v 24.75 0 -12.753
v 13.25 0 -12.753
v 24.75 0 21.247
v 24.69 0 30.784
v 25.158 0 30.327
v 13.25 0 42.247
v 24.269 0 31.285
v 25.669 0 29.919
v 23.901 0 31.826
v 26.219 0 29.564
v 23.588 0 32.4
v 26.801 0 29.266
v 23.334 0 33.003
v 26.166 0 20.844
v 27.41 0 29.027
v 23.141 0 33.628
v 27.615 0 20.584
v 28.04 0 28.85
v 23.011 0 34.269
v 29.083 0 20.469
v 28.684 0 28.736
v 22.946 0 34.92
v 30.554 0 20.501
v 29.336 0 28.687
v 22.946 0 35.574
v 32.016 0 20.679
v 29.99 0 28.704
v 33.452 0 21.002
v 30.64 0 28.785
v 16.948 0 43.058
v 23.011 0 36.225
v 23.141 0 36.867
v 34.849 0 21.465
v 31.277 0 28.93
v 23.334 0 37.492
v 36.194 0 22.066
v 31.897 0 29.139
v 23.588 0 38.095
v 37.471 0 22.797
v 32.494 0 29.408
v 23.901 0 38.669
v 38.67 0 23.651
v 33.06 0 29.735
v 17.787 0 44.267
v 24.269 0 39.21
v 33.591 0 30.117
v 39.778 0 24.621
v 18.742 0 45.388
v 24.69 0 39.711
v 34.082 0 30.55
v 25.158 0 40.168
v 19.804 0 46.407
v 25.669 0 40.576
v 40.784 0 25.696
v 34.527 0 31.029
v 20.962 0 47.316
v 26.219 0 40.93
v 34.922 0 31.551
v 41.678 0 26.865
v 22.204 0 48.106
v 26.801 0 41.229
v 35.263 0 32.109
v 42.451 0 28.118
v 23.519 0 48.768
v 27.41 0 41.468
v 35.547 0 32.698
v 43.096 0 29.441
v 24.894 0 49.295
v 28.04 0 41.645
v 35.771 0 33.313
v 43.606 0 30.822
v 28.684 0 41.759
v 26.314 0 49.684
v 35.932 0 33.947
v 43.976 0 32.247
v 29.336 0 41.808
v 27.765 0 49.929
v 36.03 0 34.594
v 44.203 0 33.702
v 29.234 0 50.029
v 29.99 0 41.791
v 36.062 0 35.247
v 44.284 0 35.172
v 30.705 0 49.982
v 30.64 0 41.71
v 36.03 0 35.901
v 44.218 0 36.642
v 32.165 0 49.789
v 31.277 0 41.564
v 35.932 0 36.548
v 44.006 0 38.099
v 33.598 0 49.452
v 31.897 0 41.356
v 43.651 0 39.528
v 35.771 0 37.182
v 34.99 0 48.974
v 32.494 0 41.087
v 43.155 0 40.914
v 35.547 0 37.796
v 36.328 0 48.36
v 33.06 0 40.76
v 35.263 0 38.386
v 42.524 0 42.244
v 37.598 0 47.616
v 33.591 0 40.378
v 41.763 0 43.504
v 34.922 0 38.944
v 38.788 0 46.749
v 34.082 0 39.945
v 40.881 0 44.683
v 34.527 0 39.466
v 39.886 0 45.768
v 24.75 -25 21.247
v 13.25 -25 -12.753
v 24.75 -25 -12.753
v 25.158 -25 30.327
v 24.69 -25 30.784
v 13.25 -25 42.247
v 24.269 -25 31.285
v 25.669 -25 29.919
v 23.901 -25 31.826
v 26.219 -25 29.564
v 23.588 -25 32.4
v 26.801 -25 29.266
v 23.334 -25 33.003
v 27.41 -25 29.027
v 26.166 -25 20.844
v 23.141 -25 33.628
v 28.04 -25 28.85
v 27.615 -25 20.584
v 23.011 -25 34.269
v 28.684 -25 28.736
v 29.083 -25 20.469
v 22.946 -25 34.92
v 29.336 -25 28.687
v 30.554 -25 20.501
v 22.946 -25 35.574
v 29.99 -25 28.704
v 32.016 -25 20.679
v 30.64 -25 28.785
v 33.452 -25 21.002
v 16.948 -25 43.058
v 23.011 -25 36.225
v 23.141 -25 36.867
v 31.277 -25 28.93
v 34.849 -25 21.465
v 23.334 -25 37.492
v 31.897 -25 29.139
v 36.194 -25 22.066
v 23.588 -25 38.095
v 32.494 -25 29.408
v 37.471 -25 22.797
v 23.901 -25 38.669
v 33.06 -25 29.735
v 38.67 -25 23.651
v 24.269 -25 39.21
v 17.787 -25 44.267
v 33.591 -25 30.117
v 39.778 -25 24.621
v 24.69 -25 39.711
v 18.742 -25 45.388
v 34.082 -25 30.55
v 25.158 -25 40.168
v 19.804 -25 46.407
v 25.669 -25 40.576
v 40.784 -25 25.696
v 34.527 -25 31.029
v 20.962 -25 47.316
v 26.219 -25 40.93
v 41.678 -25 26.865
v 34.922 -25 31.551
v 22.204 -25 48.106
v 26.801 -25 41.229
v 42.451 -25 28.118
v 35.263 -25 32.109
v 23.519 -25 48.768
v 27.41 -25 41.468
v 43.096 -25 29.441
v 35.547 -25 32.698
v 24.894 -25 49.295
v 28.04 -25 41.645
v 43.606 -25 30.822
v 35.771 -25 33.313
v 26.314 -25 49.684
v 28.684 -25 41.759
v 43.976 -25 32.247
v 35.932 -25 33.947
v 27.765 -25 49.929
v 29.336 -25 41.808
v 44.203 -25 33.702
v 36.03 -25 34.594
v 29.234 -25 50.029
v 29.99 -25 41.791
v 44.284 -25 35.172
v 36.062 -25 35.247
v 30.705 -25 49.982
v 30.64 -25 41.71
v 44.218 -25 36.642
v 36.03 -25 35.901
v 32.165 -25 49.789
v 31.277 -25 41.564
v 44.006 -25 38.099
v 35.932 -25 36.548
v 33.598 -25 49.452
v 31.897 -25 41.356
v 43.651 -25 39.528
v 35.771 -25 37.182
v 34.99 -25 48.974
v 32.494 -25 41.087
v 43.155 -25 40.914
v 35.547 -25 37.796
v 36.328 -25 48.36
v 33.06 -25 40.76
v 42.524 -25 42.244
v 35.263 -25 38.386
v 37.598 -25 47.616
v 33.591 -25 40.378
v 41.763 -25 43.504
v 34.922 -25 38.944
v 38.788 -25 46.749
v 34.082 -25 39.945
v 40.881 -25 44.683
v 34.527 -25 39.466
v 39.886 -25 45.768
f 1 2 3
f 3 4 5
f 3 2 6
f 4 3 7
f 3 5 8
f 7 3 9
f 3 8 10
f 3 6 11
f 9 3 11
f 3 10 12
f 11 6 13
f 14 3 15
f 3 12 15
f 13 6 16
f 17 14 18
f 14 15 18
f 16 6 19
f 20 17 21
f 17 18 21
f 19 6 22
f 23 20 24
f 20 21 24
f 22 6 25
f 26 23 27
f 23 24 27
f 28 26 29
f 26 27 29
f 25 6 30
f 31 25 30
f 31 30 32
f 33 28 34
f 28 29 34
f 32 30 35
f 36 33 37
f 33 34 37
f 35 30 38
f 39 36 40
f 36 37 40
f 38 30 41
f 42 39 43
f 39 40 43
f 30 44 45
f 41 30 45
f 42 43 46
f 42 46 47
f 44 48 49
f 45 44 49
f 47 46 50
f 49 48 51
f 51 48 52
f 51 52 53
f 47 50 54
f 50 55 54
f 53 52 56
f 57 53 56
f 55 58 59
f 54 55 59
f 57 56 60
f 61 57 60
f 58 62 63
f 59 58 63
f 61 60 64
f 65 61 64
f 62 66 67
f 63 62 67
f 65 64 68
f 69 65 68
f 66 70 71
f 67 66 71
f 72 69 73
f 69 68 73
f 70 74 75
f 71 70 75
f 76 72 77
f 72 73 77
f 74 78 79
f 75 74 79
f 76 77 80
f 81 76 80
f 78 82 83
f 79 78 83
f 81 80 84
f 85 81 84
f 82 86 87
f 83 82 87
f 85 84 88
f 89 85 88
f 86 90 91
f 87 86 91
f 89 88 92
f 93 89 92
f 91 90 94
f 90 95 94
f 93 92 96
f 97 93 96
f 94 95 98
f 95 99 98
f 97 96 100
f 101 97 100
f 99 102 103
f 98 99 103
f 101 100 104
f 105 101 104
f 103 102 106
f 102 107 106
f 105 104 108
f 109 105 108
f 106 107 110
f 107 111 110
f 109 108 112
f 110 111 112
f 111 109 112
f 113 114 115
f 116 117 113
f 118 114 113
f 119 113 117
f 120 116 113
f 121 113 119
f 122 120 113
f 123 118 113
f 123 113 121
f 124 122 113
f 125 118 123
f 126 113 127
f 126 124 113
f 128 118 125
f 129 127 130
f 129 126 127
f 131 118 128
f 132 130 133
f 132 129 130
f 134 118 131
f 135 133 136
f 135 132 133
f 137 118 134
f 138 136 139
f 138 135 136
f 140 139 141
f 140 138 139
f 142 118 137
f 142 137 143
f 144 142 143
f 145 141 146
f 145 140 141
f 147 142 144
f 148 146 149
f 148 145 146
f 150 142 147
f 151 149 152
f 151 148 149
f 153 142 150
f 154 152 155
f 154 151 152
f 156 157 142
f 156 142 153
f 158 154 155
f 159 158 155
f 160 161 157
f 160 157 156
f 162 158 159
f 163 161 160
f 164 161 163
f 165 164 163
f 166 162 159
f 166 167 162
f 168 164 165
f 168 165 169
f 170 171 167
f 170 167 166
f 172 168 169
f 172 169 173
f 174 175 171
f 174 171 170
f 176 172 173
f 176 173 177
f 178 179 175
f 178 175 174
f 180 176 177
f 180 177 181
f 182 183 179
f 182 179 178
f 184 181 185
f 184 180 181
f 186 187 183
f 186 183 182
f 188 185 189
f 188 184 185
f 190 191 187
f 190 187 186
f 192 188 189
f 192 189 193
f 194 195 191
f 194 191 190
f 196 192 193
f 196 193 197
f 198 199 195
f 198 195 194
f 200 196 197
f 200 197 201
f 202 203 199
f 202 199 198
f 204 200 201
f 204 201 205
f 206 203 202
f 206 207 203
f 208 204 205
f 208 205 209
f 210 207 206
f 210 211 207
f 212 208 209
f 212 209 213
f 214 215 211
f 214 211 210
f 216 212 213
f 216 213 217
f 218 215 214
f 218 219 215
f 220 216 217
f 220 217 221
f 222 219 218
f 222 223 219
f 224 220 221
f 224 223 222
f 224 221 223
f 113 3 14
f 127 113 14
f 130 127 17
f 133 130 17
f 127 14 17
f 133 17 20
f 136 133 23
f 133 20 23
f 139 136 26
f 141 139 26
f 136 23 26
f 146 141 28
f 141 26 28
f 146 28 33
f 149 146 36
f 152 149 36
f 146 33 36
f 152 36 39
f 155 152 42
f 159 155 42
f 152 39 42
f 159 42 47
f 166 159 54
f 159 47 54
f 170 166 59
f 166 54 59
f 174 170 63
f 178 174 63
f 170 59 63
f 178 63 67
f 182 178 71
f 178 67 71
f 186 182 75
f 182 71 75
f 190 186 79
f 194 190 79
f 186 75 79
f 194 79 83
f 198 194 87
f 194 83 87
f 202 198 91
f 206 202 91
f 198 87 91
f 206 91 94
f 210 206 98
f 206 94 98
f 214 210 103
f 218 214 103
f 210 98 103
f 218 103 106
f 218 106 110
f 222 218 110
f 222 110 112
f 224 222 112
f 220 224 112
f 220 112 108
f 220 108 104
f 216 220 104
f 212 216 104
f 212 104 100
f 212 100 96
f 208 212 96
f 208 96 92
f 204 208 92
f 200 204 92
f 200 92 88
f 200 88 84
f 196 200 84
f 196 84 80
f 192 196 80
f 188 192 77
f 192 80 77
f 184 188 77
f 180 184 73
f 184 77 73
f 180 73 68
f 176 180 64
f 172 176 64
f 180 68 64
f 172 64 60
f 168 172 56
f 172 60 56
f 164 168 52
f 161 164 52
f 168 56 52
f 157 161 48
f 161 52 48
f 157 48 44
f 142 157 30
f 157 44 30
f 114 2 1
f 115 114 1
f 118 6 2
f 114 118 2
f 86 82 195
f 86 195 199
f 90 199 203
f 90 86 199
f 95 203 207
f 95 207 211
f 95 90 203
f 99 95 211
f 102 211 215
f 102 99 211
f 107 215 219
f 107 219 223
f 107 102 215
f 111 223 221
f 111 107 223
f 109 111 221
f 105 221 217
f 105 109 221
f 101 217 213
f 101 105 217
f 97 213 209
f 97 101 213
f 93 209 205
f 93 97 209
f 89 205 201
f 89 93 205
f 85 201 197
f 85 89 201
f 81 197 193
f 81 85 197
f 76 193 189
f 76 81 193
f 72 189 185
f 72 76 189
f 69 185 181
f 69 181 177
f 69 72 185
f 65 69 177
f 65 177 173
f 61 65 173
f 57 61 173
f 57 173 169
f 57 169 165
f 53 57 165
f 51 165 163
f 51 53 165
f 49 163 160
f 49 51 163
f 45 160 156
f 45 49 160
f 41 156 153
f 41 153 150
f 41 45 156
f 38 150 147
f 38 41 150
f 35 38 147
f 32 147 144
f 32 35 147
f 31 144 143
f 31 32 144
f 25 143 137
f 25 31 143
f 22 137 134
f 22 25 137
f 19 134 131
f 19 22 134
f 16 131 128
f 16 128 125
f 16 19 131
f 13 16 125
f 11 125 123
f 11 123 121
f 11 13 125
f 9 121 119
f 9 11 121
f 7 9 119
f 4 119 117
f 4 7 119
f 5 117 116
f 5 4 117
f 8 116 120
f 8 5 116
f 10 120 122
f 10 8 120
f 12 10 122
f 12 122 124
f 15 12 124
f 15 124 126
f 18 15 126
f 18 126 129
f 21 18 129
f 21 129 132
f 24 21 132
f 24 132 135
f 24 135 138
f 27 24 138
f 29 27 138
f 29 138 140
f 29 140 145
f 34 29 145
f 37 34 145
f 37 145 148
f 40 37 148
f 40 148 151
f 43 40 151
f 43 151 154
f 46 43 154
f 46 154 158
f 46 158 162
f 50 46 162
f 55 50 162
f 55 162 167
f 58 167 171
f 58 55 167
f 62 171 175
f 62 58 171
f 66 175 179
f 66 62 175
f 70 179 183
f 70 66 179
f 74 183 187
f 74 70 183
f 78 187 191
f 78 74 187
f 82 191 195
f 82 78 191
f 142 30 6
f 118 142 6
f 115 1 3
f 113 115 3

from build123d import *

# Parameters (mm, degrees)
F0_R     = 6.562201
F1_DEPTH = 25


with BuildPart() as f1:
    # F0 (on Front) → F1 (new body)
    with BuildSketch(Plane.XZ):
        with BuildLine():
            Line((16.947664, 43.057742), (13.250001, 42.2474))
            Line((13.250001, 42.2474), (13.250001, -12.752604))
            Line((13.250001, -12.752604), (24.750002, -12.752604))
            Line((24.750002, -12.752604), (24.750002, 21.247396))
            ThreePointArc((24.750002, 21.247396), (43.41997, 40.227069), (16.947664, 43.057742))
        make_face()
        with Locations((29.500002, 35.2474)):
            Circle(F0_R, mode=Mode.SUBTRACT)
    extrude(amount=F1_DEPTH)


solid = f1.part
